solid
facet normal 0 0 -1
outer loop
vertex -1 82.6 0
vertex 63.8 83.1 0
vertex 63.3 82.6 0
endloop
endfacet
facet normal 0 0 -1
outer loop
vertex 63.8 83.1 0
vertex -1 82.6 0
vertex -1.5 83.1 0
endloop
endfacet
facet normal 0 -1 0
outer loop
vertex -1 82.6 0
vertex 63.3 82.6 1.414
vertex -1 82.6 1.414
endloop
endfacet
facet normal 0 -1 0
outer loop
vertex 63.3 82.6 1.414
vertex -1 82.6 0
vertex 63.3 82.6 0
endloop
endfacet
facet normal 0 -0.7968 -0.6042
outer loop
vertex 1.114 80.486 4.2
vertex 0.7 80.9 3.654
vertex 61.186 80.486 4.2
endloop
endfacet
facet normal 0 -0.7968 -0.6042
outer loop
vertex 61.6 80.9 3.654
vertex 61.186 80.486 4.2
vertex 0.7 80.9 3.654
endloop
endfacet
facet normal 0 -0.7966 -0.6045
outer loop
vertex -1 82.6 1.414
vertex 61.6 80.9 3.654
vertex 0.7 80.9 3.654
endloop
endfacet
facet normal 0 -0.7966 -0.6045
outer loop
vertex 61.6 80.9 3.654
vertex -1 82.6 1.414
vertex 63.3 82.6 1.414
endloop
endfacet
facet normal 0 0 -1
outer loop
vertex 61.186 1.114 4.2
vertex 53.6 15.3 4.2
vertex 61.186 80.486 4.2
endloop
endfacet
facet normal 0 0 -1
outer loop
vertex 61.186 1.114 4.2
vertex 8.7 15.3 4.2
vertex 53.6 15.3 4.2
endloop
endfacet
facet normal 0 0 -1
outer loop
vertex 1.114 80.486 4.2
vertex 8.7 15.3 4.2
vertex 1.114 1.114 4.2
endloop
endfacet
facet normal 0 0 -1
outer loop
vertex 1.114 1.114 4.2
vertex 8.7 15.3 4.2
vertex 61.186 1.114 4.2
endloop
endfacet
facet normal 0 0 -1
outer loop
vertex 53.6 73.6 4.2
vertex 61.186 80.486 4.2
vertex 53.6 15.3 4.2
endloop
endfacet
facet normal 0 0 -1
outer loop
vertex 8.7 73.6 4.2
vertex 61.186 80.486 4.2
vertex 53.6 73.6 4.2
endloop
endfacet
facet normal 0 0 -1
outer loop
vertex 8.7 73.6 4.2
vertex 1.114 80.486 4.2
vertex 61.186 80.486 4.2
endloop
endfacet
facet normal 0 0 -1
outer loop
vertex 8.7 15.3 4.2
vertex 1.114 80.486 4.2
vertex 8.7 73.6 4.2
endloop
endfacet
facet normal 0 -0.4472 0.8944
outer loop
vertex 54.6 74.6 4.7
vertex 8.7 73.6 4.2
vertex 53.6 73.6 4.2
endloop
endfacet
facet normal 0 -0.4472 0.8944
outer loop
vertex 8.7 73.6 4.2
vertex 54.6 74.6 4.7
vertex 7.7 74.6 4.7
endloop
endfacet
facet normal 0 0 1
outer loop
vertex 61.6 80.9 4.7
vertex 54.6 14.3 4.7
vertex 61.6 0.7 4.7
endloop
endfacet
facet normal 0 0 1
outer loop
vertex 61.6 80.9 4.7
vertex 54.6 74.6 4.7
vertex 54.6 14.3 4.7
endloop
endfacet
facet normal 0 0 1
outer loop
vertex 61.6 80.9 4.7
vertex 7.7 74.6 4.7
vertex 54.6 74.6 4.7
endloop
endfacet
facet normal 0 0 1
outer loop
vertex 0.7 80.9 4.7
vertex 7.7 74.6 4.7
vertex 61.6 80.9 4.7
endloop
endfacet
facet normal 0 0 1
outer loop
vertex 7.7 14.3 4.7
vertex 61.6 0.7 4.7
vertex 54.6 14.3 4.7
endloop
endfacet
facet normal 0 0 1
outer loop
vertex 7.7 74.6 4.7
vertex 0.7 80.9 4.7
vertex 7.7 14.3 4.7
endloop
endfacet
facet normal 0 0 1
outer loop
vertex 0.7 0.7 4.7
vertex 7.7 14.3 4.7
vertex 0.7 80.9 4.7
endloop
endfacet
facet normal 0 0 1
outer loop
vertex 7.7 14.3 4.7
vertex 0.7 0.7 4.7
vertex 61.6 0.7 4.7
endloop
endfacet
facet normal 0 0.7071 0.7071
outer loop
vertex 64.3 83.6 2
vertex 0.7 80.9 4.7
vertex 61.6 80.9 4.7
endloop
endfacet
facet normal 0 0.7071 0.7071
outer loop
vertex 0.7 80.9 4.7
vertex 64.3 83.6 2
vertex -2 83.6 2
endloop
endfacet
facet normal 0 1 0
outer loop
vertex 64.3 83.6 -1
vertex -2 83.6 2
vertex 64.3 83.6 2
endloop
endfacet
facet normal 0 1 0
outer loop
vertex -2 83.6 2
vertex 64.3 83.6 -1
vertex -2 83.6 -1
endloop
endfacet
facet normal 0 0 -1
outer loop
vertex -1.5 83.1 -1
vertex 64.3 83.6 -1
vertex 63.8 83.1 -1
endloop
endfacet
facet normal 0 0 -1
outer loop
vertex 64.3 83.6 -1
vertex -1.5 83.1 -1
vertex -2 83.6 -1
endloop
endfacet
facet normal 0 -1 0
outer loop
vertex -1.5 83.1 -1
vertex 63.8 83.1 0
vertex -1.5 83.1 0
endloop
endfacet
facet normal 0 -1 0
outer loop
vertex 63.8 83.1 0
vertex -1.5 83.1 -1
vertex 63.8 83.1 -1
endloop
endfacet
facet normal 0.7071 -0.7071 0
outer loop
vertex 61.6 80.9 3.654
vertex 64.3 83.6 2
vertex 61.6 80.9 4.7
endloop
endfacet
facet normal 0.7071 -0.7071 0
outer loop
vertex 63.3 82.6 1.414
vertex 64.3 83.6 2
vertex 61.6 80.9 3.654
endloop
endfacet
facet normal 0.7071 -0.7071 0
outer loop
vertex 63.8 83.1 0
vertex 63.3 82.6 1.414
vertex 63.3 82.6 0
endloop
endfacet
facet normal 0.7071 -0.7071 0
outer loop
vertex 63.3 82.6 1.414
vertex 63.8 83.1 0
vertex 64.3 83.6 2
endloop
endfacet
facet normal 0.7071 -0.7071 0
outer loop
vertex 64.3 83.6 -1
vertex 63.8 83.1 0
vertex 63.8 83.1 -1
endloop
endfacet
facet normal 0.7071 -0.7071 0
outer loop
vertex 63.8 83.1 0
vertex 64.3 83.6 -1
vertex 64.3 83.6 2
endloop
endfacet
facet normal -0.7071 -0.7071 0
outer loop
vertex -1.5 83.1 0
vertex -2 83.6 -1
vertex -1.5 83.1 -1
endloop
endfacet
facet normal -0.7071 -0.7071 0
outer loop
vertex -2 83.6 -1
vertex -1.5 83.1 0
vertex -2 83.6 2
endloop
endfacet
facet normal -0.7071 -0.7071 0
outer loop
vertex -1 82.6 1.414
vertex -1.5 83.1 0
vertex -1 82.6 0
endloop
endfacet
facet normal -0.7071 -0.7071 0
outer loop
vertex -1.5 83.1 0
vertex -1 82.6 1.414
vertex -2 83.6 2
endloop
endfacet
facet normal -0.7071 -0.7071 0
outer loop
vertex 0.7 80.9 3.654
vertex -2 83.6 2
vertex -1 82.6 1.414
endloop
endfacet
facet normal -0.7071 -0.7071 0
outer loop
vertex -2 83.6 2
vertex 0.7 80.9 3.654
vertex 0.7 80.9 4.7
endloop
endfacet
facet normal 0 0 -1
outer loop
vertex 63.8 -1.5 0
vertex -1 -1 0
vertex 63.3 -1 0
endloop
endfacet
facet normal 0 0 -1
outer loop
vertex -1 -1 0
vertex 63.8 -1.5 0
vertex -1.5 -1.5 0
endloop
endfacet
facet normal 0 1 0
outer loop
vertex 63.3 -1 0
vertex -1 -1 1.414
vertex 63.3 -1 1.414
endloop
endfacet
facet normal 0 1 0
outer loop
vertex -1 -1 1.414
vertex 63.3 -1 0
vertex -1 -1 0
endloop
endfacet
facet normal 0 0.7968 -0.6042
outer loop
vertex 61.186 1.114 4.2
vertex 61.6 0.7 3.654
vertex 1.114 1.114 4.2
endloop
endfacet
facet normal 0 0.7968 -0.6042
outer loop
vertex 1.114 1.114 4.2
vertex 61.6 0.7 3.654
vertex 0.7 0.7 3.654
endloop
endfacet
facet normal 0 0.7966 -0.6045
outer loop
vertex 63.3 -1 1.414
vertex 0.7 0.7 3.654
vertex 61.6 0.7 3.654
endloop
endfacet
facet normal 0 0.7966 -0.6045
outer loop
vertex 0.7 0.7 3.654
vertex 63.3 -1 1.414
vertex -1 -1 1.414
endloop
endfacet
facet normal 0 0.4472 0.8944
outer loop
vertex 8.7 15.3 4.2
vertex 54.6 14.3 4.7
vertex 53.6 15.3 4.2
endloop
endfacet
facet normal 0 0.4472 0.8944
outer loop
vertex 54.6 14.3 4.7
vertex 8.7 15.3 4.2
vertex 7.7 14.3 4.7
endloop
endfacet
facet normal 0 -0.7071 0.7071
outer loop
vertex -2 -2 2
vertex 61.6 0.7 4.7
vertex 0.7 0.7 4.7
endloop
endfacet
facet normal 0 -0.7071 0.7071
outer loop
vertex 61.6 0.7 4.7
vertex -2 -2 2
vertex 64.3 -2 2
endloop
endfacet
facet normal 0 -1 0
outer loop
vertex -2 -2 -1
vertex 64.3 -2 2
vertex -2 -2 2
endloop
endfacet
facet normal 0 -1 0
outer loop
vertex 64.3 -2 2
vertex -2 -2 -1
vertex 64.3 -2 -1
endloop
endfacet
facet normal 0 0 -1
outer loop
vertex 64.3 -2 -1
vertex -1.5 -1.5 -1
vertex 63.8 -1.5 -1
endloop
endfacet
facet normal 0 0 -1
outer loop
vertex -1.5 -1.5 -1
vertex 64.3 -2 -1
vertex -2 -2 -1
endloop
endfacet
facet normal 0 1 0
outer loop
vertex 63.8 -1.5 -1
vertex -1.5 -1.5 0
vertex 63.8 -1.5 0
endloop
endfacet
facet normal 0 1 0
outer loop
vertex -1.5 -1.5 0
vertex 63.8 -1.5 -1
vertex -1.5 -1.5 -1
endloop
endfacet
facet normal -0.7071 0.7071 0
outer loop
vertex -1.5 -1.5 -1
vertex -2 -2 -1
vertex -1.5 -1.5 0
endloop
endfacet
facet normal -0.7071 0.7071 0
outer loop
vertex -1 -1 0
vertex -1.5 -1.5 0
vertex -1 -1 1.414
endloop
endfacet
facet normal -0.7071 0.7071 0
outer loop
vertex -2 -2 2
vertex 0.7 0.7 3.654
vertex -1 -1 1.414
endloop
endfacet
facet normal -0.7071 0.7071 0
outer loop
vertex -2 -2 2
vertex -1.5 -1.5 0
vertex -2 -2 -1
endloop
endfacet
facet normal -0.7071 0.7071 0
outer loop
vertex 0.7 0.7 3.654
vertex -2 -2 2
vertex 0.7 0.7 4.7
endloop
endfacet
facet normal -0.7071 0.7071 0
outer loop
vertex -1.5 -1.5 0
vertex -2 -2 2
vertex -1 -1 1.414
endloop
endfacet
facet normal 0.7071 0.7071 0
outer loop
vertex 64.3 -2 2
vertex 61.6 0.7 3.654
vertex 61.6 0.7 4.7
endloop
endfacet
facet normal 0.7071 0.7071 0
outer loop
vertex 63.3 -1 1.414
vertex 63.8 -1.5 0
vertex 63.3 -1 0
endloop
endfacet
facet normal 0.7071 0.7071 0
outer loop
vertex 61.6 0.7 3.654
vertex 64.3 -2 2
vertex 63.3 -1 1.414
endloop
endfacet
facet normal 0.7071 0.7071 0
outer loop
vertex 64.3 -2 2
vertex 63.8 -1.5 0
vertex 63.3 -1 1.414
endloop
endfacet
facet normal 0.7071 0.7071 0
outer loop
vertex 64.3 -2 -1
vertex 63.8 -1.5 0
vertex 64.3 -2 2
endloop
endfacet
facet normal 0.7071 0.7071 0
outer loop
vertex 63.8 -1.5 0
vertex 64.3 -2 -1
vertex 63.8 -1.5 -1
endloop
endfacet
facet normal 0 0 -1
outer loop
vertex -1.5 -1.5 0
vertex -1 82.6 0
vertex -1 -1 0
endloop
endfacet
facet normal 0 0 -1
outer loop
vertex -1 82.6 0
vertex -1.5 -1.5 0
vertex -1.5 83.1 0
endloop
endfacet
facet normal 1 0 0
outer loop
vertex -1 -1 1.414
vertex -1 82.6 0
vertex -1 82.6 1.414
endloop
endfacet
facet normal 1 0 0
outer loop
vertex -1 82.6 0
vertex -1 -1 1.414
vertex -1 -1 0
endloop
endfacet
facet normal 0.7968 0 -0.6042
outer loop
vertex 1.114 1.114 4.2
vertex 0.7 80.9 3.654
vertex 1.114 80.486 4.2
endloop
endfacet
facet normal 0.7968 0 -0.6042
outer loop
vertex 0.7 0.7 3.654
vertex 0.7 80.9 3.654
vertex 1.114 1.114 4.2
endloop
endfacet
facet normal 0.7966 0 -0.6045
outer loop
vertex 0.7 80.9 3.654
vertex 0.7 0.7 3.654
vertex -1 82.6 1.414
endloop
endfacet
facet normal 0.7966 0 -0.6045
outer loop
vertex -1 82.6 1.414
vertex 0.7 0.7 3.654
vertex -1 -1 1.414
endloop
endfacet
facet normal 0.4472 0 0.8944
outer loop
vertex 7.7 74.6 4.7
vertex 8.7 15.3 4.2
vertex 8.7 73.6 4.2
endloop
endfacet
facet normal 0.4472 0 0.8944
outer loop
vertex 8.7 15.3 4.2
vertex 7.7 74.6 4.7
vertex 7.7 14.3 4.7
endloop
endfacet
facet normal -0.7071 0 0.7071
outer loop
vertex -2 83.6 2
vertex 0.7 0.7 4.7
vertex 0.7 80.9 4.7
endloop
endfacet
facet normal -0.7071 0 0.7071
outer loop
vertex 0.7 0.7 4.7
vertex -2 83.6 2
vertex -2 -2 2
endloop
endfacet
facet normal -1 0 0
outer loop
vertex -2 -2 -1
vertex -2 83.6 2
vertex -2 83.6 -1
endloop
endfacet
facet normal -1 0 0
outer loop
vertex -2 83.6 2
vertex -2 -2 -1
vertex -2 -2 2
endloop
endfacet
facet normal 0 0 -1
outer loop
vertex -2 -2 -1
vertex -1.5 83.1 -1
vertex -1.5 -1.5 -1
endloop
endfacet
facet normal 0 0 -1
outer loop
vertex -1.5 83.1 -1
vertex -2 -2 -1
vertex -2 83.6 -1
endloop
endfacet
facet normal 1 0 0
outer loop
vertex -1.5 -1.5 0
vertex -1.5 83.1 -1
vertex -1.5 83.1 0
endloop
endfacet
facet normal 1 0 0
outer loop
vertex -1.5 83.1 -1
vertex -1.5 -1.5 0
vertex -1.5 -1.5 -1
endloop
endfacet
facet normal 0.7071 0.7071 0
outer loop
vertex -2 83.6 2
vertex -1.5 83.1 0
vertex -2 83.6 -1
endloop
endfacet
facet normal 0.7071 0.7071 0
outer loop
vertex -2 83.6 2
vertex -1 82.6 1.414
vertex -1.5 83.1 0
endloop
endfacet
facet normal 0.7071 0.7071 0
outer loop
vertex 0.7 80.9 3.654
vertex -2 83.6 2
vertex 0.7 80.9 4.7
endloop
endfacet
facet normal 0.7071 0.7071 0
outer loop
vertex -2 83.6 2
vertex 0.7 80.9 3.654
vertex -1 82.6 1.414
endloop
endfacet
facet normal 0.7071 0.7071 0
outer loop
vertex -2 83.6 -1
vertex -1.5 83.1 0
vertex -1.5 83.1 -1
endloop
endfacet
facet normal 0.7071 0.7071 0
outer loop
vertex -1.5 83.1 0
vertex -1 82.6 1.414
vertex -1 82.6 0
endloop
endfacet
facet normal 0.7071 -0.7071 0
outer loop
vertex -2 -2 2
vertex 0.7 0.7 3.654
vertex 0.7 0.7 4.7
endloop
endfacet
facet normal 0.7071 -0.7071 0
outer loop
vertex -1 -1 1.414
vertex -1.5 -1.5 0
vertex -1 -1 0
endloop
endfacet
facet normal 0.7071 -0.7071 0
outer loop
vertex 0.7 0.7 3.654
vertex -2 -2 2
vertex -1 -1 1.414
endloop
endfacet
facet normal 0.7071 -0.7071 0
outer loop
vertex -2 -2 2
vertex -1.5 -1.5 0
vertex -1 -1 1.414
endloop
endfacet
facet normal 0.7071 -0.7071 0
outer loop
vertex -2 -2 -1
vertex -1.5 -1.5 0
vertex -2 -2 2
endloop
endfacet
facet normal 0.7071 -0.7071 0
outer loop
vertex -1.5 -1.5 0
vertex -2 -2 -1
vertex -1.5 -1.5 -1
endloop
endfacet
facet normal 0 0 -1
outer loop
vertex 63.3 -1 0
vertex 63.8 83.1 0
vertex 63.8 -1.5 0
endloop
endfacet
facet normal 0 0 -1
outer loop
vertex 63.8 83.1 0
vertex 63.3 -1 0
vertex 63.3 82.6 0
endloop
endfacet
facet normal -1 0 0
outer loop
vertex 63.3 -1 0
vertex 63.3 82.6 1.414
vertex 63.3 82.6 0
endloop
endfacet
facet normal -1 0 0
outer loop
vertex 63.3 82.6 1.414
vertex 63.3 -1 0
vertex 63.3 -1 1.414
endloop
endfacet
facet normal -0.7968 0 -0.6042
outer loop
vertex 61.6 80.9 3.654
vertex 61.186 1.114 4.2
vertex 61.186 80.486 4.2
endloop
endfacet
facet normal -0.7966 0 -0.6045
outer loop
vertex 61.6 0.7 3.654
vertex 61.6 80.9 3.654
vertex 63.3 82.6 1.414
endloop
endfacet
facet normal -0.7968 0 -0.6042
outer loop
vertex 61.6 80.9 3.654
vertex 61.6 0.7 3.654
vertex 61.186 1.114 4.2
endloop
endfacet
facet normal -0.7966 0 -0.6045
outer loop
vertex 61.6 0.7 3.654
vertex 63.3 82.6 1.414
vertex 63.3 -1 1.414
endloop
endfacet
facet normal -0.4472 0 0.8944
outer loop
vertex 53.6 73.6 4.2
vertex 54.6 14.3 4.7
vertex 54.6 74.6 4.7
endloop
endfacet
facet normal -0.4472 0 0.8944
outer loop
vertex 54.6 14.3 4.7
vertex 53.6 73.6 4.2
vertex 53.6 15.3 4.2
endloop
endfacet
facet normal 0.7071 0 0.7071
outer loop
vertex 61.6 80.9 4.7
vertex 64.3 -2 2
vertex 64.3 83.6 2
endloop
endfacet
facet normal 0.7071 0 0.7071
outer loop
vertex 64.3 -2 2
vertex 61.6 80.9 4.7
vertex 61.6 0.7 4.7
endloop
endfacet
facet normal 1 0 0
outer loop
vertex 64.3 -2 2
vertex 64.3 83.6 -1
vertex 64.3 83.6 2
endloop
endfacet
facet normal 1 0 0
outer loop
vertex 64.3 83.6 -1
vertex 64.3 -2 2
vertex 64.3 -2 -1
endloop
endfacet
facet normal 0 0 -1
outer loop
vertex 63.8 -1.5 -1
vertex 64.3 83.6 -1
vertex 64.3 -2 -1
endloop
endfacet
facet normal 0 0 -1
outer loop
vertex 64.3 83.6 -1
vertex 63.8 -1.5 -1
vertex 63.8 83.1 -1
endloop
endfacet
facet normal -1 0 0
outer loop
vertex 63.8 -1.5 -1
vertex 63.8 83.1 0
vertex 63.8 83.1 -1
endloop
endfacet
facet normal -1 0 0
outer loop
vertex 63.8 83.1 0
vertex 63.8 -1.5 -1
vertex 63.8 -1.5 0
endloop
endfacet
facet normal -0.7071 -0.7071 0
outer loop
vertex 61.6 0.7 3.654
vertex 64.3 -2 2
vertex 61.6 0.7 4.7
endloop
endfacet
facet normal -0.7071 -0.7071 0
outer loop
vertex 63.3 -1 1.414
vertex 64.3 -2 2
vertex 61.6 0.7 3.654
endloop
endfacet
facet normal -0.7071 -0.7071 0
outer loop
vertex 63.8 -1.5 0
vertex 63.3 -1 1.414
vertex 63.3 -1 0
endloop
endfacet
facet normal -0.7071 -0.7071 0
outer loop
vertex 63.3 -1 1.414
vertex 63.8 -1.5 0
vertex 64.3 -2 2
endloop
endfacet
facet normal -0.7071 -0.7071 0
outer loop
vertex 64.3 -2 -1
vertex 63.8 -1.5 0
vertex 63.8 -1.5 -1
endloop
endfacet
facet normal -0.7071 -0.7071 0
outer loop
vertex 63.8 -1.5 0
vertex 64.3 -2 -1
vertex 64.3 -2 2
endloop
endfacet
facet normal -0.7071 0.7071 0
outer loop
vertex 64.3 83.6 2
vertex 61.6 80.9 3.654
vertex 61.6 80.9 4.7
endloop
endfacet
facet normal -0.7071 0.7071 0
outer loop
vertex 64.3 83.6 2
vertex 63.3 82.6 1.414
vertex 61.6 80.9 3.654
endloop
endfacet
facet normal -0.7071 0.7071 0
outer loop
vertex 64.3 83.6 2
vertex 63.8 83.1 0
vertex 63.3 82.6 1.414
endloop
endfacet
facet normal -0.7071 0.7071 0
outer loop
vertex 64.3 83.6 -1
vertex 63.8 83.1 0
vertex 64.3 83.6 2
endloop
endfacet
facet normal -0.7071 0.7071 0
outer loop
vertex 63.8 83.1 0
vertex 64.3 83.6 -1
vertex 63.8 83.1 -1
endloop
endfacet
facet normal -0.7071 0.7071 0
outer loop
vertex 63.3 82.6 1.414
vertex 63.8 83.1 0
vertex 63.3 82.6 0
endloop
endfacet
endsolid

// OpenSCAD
/*
 *  Ardunio Universal Remote
 *  Copyright (C) 2019 Jeff Tickle
 *
 *  This program is free software: you can redistribute it and/or modify
 *  it under the terms of the GNU General Public License as published by
 *  the Free Software Foundation, either version 3 of the License, or
 *  (at your option) any later version.
 *
 *  This program is distributed in the hope that it will be useful,
 *  but WITHOUT ANY WARRANTY; without even the implied warranty of
 *  MERCHANTABILITY or FITNESS FOR A PARTICULAR PURPOSE.  See the
 *  GNU General Public License for more details.
 *
 *  You should have received a copy of the GNU General Public License
 *  along with this program.  If not, see <https://www.gnu.org/licenses/>.
 */

SCREEN_WIDTH = 45.6;
SCREEN_HEIGHT = 58.3;
HOLE_DIAMETER = 3.15;
DISPLAY_BOARD_WIDTH_OUTER = 62.3;
DISPLAY_BOARD_WIDTH_INNER = 50.8;
DISPLAY_BOARD_HEIGHT = 81.6;
DISPLAY_BOARD_DEPTH = 0.50;
DISPLAY_DEPTH = 3.7;
DISPLAY_WIDTH = 50.2;
DISPLAY_HEIGHT = 69.3;

DISPLAY_MOUNT_RECT_LENGTH = 3.25;
DISPLAY_MOUNT_RECT_WIDTH = 5.00;

BEZEL_TOP = 10.00;
BEZEL_LEFT = 8.70;
BEZEL_BOTTOM = 13.3;
BEZEL_RIGHT = 8.70;

TOTAL_DEPTH = DISPLAY_DEPTH + DISPLAY_BOARD_DEPTH + 0.5;

SCREEN_CENTER = [
    DISPLAY_BOARD_WIDTH_OUTER / 2,
    (DISPLAY_BOARD_HEIGHT / 2) + (BEZEL_BOTTOM - BEZEL_TOP)
];

// Clipped Draw Side
module drawSide(height, width, length) {
    intersection() {
        rotate([90, 0, 0]) {
            linear_extrude(
                height = length) {
                    polygon([
                             [0.00, -1.00],
                             [0.00, 2.00],
                             [height - 2.00, height],
                             [width - 1.00, height],
                             [width, height - 0.50],
                             [height - 3.00 + sqrt(2), height - 0.50],
                             [1.00, sqrt(2)],
                             [1.00, 0.00],
                             [0.50, 0.00],
                             [0.50, -1.00]]);
            }
                //linear_extrude(
                //    height = height * 2,
                //    center=true) {

                //}
            //}
        }
        linear_extrude(height = height * 3, center = true) {
            polygon([[0, 0],
                     [height - 2, -(height - 2)],
                     [width, -(height - 2)],
                     [width, -(length - (height - 2))],
                     [height - 2, -(length - (height - 2))],
                     [0, -length]]);
        }
    }
}

module drawDisplayMount() {
    circle_tx = [DISPLAY_MOUNT_RECT_WIDTH / 2, 0, 0];
    difference() {
        union() {
            square([DISPLAY_MOUNT_RECT_WIDTH,
                    DISPLAY_MOUNT_RECT_LENGTH]);
            translate(circle_tx) {
                    circle(d = DISPLAY_MOUNT_RECT_WIDTH, $fn = 25);
                }
        }
        translate(circle_tx) {
            circle(d = HOLE_DIAMETER, $fn = 25);
        }
    }
}

module drawDisplayMountSide() {
    drawDisplayMount();
    translate([DISPLAY_BOARD_HEIGHT - DISPLAY_MOUNT_RECT_WIDTH, 0, 0]) {
        drawDisplayMount();
    }
}

module drawDisplayModule() {
    translate([DISPLAY_MOUNT_RECT_LENGTH + (DISPLAY_MOUNT_RECT_WIDTH / 2), 0, 0]) {
        union() {
            linear_extrude(height = DISPLAY_BOARD_DEPTH) {
                    union() {
                        square([DISPLAY_BOARD_WIDTH_INNER,
                               DISPLAY_BOARD_HEIGHT]);
                        translate([DISPLAY_BOARD_WIDTH_INNER + DISPLAY_MOUNT_RECT_LENGTH, 0, 0]) {
                            rotate([0, 0, 90]) {
                                drawDisplayMountSide();
                            }
                        }
                        translate([0 - DISPLAY_MOUNT_RECT_LENGTH, DISPLAY_BOARD_HEIGHT, 0]) {
                            rotate([0, 0, 270]) {
                                drawDisplayMountSide();
                            }
                        }
                    }
            }
            translate([0,(DISPLAY_BOARD_HEIGHT - DISPLAY_HEIGHT) / 2,DISPLAY_BOARD_DEPTH]) {
                difference() {
                    cube([DISPLAY_BOARD_WIDTH_INNER,
                          DISPLAY_HEIGHT,
                          DISPLAY_DEPTH]);
                    translate([(DISPLAY_BOARD_WIDTH_INNER / 2) - (SCREEN_WIDTH / 2),
                               (DISPLAY_HEIGHT / 2) - (SCREEN_HEIGHT / 2) + BEZEL_BOTTOM - BEZEL_TOP,
                               DISPLAY_DEPTH - 0.1]) {
                        cube([SCREEN_WIDTH,
                              SCREEN_HEIGHT,
                              10]);
                    }
                }
            }
        }
    }
}

module drawScreenCenter() {
    translate([SCREEN_CENTER[0], SCREEN_CENTER[1], 0]) {
        cylinder(10, r=1);
    }
}

module drawTopHalf() {

    // Draw Top Side
    translate([2, DISPLAY_BOARD_HEIGHT - BEZEL_TOP, 0]) {
        translate([DISPLAY_BOARD_WIDTH_OUTER, BEZEL_TOP + 2, 0]) {
            rotate([0, 0, 270]) {
                drawSide(TOTAL_DEPTH, BEZEL_TOP, DISPLAY_BOARD_WIDTH_OUTER + 4);
            }
        }
    }

    // Draw Bottom Side
    translate([-2, -2, 0]) {
        translate([0, 0, 0]) {
            rotate([0, 0, 90]) {
                drawSide(TOTAL_DEPTH, BEZEL_BOTTOM + 4, DISPLAY_BOARD_WIDTH_OUTER + 4);
            }
        }
    }

    // Draw Left Side
    translate([-2, DISPLAY_BOARD_HEIGHT + 2, 0]) {
        drawSide(TOTAL_DEPTH, BEZEL_LEFT + 2, DISPLAY_BOARD_HEIGHT + 4);
    }

    // Draw Right Side
    translate([DISPLAY_BOARD_WIDTH_OUTER, 0, 0]) {
        translate([2, -2, 0]) {
            rotate([0, 0, 180]) {
                drawSide(TOTAL_DEPTH, BEZEL_RIGHT + 2, DISPLAY_BOARD_HEIGHT + 4);
            }
        }
    }
}

// Disable for printing
*drawScreenCenter();

// Disable for printing
*drawDisplayModule();

// Enable for prin
drawTopHalf();
